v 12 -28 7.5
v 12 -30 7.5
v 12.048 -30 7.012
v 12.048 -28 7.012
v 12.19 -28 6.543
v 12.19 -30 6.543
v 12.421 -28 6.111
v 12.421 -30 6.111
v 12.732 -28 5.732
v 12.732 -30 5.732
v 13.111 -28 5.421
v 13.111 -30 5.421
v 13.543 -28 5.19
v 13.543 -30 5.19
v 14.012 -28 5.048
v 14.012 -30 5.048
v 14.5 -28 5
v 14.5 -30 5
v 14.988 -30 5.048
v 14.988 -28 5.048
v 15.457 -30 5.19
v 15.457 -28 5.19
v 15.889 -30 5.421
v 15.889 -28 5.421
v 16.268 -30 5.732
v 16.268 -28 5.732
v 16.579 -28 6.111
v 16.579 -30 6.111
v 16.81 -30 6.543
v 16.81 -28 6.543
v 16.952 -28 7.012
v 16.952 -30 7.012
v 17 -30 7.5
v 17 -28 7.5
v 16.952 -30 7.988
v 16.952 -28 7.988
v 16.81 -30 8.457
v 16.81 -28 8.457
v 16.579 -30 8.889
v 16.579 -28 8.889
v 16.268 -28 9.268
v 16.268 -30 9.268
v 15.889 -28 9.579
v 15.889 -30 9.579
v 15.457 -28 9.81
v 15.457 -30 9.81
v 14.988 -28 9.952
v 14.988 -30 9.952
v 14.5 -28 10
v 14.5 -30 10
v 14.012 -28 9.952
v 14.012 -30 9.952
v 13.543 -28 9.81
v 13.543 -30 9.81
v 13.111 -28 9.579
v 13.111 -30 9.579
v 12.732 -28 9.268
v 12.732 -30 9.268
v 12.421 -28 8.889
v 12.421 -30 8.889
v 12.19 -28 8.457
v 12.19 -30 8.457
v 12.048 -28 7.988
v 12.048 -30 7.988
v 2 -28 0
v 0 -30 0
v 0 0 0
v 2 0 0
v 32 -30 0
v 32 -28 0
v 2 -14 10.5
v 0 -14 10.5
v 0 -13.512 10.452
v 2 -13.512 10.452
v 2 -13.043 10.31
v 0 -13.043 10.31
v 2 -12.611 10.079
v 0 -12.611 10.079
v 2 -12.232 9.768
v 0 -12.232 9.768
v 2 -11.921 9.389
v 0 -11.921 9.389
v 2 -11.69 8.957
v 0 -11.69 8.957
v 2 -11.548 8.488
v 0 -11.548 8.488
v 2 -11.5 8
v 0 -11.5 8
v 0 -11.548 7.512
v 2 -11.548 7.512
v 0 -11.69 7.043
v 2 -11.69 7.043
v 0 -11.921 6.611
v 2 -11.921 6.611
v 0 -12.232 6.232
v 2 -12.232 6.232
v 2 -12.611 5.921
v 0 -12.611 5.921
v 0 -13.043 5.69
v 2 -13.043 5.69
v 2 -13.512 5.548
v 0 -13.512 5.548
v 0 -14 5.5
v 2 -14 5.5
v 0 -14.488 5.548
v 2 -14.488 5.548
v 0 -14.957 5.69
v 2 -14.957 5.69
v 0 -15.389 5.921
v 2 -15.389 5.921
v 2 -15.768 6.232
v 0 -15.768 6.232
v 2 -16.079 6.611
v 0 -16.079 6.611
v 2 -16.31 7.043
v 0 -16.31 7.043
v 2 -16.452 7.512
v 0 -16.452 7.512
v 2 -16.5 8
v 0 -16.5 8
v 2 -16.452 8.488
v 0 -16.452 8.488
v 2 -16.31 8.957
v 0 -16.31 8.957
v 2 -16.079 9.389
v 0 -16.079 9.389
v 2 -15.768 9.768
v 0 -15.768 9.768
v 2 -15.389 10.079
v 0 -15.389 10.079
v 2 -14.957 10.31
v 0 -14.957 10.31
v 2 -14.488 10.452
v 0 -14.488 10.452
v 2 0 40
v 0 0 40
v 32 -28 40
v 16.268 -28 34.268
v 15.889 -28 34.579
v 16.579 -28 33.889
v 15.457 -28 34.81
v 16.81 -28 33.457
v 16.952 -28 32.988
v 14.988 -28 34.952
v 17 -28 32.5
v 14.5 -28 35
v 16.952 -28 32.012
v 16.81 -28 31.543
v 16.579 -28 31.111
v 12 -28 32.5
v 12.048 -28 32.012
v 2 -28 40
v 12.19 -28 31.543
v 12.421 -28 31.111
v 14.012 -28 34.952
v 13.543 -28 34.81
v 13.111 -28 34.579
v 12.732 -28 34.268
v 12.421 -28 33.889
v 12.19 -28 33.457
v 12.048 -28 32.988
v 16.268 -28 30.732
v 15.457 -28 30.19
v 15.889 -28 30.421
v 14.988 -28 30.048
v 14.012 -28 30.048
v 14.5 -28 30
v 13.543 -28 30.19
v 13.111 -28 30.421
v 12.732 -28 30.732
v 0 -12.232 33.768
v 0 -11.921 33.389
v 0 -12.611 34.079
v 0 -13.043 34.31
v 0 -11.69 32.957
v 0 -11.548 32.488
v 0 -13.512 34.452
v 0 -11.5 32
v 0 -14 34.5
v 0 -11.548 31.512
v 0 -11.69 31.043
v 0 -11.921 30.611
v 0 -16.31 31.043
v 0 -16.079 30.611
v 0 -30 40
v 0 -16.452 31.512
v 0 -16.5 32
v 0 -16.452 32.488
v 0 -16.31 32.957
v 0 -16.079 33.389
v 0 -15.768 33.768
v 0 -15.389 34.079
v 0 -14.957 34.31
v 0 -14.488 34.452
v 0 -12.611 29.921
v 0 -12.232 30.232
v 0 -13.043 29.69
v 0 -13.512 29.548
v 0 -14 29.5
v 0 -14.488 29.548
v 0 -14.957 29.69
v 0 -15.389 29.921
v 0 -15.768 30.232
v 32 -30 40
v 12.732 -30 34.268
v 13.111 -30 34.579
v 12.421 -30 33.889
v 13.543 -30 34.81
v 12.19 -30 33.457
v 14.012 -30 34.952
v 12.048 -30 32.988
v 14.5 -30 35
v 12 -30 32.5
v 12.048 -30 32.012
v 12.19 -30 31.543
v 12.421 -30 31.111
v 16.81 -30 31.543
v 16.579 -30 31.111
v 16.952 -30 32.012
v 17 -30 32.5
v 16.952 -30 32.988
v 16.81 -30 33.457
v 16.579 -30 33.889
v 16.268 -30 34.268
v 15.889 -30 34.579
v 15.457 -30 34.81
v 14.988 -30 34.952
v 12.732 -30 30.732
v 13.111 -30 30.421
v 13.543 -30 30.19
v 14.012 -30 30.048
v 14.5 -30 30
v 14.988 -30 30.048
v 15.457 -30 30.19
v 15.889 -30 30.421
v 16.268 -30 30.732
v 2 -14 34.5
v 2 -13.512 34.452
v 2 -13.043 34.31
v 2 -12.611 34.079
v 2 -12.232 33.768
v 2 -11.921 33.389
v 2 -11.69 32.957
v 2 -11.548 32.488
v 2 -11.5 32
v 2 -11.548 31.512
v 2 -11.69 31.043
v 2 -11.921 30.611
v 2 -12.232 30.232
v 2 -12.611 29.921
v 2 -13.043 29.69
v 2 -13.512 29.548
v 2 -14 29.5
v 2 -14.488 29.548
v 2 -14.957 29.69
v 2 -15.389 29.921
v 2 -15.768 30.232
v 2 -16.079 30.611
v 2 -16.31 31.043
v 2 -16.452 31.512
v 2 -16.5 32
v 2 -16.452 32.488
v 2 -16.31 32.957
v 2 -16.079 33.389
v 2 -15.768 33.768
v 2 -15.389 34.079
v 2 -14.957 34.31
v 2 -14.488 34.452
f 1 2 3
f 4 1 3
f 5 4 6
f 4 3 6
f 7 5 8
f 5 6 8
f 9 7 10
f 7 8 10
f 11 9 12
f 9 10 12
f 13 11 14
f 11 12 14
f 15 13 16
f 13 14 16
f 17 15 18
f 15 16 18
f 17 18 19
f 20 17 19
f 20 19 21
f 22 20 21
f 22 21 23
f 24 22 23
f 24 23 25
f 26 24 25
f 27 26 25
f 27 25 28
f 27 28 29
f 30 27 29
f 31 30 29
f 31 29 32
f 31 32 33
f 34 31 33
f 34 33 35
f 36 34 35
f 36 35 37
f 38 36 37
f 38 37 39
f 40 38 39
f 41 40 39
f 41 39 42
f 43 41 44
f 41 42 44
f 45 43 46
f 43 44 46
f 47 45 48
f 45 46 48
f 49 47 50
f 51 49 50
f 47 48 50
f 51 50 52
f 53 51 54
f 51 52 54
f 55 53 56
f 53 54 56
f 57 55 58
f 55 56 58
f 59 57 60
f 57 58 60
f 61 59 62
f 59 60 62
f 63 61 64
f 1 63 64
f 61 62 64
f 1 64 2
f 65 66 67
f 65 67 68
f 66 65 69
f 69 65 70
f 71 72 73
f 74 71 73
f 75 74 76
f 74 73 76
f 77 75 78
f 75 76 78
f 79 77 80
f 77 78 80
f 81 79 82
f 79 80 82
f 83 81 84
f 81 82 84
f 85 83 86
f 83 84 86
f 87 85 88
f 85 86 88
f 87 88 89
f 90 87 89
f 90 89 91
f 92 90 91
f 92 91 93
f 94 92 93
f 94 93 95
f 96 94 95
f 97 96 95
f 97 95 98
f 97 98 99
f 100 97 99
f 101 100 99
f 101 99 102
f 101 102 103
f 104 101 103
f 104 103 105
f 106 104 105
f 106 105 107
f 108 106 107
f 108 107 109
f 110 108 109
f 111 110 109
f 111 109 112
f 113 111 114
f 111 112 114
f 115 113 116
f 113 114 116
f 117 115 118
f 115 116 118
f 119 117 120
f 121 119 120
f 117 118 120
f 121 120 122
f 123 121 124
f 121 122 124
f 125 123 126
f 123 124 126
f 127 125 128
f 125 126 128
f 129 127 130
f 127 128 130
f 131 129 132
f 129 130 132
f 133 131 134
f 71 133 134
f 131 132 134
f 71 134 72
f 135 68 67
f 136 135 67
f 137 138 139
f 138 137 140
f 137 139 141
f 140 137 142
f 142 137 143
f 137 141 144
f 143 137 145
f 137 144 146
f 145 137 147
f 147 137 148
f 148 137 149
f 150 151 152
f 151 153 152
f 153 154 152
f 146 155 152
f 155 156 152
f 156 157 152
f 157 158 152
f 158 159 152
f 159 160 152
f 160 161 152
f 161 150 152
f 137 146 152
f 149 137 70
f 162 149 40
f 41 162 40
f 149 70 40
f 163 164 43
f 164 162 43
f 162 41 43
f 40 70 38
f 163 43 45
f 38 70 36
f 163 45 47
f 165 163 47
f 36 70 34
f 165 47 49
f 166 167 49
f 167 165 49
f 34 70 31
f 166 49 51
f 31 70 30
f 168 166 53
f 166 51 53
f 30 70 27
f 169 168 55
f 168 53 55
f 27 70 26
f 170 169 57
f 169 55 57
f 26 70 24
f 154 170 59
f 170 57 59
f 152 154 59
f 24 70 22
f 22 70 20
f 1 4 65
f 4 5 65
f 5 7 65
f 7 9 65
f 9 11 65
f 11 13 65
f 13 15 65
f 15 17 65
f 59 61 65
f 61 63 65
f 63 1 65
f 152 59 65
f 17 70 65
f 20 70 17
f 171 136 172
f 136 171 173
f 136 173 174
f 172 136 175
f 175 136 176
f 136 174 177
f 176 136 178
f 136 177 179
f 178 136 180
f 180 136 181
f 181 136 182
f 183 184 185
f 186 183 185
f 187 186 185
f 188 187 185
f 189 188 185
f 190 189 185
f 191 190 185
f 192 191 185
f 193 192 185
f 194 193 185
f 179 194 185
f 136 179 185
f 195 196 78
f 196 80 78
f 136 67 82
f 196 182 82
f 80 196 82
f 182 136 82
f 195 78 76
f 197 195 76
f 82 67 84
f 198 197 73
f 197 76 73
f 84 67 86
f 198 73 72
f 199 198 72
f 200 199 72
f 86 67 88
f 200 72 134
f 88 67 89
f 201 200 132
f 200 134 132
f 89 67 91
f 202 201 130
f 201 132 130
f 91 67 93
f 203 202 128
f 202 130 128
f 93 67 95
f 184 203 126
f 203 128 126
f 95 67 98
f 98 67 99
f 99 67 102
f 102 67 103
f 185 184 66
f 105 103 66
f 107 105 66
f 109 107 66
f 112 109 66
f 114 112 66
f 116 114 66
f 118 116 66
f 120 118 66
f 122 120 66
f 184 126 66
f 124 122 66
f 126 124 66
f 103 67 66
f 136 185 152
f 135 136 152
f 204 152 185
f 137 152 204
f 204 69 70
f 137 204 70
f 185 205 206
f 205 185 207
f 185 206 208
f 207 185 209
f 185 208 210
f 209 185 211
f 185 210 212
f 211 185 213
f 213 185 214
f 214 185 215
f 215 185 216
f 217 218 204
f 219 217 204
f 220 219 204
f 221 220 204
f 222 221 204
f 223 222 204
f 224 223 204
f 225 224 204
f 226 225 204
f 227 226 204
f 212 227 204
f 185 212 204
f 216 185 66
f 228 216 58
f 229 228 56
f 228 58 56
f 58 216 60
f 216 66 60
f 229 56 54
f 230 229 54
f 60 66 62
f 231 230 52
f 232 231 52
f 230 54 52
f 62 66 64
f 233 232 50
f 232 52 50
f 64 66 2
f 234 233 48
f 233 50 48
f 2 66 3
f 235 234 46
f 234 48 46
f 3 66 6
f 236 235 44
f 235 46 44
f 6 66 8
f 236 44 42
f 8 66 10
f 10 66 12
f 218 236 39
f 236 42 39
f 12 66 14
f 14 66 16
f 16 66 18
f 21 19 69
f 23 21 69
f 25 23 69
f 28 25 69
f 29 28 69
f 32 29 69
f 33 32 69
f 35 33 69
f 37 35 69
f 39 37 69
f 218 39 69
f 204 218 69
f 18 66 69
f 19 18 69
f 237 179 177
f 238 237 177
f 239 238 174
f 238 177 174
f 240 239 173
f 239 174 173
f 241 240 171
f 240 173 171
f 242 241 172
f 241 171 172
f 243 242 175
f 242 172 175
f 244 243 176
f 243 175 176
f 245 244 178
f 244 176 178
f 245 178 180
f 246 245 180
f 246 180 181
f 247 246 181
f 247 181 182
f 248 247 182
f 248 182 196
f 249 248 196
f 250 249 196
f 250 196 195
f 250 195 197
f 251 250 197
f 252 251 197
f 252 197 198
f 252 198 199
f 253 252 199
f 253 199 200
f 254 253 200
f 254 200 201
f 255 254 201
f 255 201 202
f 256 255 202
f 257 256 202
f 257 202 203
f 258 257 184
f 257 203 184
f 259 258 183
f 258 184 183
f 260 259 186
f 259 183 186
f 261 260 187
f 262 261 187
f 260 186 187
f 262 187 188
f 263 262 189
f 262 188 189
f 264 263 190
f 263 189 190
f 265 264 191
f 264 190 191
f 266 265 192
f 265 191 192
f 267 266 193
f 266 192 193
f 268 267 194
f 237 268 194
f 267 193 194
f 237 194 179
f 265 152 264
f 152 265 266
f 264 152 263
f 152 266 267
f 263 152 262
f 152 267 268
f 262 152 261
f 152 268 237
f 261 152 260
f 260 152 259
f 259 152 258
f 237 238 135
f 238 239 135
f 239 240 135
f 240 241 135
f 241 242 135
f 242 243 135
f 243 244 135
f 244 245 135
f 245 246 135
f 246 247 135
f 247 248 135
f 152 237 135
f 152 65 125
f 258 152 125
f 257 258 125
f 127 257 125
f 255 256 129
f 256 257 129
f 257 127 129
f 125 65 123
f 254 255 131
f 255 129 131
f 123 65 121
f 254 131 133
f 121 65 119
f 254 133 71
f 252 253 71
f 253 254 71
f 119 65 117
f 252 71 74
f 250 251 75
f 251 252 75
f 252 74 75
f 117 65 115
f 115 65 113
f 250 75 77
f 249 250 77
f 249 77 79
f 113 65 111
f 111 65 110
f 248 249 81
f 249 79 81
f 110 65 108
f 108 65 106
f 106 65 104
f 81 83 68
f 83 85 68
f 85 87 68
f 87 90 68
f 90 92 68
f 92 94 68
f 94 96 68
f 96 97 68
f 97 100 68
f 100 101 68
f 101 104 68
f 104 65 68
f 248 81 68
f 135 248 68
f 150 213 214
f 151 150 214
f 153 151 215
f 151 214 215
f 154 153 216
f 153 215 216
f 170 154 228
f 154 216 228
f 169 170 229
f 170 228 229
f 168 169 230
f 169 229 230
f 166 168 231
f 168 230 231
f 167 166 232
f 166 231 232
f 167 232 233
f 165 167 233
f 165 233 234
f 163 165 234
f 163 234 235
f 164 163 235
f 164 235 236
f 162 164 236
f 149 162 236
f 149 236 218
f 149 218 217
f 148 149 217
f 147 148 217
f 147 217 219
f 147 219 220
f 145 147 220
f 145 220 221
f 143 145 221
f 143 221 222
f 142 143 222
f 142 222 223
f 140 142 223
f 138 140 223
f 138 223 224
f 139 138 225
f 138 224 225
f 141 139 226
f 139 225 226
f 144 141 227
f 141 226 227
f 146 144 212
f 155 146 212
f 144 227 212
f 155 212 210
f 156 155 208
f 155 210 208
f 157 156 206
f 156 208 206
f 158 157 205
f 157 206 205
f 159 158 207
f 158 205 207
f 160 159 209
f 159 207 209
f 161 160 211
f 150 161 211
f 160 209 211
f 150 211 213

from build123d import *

# Parameters (mm, degrees)
BOSS_EXTRUDE1_DEPTH         = 40
TAP_DRILL_FOR_M6X1_0_TAP1_D = 5
TAP_DRILL_FOR_M6X1_0_TAP2_D = 5


with BuildPart() as part:
    # Sketch1 → Boss-Extrude1 (new body)
    with BuildSketch(Plane.XY):
        Polygon((0, 0), (0, -30), (32, -30), (32, -28), (2, -28), (2, 0), align=None)
    extrude(amount=BOSS_EXTRUDE1_DEPTH)

    # Tap Drill for M6x1.0 Tap1 (through all)
    with Locations(Plane(origin=(0, -28, 0), x_dir=(1, 0, 0), z_dir=(0, 1, 0))):
        with Locations((14.5, -7.5), (14.5, -32.5)):
            Hole(TAP_DRILL_FOR_M6X1_0_TAP1_D / 2)

    # Tap Drill for M6x1.0 Tap2 (through all)
    with Locations(Plane(origin=(2, 0, 0), x_dir=(0, 0, -1), z_dir=(1, 0, 0))):
        with Locations((-32, -14), (-8, -14)):
            Hole(TAP_DRILL_FOR_M6X1_0_TAP2_D / 2)


solid = part.part
